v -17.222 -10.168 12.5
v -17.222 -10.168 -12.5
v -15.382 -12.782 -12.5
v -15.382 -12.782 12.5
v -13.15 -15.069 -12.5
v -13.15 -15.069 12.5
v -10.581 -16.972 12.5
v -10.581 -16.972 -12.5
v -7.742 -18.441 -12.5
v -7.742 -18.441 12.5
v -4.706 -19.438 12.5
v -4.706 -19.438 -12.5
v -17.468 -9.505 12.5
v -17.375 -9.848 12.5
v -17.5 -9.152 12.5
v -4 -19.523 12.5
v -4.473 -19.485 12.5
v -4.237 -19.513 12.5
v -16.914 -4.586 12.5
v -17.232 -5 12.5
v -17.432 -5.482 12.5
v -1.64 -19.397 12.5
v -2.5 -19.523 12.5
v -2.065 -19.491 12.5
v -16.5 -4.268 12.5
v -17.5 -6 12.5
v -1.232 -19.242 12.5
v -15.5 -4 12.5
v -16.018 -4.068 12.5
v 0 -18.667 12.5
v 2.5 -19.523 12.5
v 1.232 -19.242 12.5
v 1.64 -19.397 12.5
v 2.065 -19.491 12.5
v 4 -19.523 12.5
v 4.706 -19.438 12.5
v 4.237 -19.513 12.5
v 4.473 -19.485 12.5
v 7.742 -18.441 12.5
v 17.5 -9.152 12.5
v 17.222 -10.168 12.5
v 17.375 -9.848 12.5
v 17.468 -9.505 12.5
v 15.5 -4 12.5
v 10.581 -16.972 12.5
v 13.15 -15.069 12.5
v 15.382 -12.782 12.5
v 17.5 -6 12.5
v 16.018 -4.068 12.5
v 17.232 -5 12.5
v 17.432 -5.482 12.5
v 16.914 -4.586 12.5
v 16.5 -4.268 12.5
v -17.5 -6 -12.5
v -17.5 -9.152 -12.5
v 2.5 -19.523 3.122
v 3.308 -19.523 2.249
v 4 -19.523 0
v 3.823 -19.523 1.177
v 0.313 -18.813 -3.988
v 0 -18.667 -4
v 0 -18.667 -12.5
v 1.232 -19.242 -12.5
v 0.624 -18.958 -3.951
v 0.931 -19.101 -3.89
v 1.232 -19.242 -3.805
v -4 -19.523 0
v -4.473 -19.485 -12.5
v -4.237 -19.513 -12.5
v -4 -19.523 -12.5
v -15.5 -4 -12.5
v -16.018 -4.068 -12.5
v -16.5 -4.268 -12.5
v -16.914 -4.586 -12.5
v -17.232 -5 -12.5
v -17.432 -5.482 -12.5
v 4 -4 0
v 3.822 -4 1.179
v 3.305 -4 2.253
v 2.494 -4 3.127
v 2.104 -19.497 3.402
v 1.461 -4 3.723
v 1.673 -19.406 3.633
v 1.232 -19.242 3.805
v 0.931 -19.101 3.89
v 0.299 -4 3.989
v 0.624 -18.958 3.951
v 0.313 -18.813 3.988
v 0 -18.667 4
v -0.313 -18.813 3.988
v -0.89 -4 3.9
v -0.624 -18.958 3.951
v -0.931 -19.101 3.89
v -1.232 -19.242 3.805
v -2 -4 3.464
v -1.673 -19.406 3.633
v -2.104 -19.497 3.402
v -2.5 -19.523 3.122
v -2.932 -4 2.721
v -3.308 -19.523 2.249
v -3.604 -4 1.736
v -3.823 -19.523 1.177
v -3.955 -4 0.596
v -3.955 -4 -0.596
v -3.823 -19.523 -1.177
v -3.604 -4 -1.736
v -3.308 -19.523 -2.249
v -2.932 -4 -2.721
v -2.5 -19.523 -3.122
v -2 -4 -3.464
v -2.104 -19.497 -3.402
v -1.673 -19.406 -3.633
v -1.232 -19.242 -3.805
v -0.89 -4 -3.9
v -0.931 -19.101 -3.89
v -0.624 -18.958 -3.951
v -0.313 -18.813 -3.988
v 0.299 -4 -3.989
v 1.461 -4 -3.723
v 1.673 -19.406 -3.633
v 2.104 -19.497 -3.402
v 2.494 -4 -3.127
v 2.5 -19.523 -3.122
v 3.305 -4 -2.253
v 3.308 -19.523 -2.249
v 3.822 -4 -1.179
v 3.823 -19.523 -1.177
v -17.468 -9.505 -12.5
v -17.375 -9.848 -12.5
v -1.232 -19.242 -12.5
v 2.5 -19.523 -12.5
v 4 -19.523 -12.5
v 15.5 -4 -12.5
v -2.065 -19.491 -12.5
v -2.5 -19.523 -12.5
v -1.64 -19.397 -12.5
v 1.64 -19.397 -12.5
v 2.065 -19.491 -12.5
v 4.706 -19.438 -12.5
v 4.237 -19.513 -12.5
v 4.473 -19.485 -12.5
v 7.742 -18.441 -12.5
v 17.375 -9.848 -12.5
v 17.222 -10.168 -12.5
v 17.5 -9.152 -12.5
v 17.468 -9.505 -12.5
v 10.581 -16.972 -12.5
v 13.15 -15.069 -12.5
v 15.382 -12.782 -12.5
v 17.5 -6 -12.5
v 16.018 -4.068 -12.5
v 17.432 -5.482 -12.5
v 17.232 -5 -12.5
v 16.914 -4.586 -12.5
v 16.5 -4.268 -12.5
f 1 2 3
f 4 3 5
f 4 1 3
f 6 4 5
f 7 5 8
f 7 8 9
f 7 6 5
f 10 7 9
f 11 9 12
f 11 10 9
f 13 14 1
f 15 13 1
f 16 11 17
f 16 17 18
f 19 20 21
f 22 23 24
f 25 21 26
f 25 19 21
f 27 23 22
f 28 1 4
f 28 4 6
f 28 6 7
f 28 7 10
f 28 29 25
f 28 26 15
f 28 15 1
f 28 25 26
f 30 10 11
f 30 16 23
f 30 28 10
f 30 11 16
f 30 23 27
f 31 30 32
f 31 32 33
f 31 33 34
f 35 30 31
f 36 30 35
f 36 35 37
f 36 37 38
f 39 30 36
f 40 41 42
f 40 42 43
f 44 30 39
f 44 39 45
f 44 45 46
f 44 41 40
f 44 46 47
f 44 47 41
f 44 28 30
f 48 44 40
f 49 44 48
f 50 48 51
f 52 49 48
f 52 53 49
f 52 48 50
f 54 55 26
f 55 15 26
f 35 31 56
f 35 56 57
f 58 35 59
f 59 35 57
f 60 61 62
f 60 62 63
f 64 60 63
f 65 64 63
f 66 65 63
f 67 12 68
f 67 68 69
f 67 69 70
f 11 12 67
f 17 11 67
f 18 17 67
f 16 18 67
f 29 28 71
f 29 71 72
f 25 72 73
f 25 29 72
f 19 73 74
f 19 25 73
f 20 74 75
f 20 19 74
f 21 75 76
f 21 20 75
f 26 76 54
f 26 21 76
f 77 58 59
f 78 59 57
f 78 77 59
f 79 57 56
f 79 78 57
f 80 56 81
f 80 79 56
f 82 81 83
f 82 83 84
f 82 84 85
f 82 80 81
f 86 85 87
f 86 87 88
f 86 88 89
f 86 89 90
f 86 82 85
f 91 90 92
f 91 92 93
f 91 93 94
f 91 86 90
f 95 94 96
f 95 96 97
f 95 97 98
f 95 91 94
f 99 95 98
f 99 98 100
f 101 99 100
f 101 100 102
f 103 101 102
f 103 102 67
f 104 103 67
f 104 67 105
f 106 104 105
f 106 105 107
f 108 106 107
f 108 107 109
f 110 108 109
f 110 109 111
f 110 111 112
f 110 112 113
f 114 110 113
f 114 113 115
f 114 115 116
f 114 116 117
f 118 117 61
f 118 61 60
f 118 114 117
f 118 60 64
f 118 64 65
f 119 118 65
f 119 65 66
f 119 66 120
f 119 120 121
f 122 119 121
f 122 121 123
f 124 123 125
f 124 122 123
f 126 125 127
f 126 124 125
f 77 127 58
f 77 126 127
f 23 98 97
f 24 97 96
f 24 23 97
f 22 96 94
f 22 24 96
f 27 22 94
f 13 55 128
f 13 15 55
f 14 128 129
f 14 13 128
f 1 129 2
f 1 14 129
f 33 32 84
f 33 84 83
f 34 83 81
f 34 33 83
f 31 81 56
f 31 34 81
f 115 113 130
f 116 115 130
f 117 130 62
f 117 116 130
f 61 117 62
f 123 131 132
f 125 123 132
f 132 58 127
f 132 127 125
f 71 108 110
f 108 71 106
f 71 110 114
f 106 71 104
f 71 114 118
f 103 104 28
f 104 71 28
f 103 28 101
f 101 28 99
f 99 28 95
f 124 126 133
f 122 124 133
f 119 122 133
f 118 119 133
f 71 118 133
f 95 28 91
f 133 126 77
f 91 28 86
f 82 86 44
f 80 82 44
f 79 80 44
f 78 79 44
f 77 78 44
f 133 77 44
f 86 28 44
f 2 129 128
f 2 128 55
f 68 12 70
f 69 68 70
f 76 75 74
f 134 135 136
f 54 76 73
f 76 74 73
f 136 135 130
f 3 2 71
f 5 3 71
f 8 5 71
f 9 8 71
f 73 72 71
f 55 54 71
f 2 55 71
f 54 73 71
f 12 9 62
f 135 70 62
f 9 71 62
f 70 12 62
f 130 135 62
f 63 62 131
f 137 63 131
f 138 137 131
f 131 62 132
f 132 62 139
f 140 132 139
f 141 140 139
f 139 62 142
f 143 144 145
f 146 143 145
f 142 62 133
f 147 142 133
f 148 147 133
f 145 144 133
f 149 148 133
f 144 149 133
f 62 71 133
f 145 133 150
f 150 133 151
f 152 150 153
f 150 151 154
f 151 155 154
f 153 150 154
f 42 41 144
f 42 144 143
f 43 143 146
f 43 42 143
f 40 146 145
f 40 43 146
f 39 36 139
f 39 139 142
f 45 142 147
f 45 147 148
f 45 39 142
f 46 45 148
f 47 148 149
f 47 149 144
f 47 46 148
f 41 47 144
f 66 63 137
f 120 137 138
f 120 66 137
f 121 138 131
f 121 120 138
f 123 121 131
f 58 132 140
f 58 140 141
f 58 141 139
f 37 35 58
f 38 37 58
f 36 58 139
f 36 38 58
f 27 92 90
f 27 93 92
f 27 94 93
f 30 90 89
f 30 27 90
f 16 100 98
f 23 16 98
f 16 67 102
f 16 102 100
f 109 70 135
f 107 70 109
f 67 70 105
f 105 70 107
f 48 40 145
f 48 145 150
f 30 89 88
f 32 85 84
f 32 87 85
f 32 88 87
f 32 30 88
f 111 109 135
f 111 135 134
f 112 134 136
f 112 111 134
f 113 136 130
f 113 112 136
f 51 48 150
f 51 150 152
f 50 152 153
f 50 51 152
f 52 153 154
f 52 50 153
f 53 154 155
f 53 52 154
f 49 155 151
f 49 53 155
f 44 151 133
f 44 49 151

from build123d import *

# Parameters (mm, degrees)
PAD_DEPTH         = 12.5
SKETCH001_R       = 4
POCKET_DEPTH      = 0.001
POCKET_DEPTH_BACK = -19.523712


with BuildPart() as part:
    # Sketch → Pad (new body, symmetric)
    with BuildSketch(Plane.XY):
        with BuildLine():
            ThreePointArc((-17.222222, -10.168336), (-11.903544, -16.07189), (-4.705882, -19.438484))
            ThreePointArc((-4.705882, -19.438484), (-4.355445, -19.50158), (-4, -19.522712))
            Line((-4, -19.522712), (-2.5, -19.522712))
            ThreePointArc((-2.5, -19.522712), (-1.850681, -19.4516), (-1.232145, -19.241635))
            Line((-1.232145, -19.241635), (0, -18.667076))
            Line((0, -18.667076), (1.232145, -19.241635))
            ThreePointArc((1.232145, -19.241635), (1.850681, -19.4516), (2.5, -19.522712))
            Line((2.5, -19.522712), (4, -19.522712))
            ThreePointArc((4, -19.522712), (4.355445, -19.50158), (4.705882, -19.438484))
            ThreePointArc((4.705882, -19.438484), (11.903544, -16.07189), (17.222222, -10.168336))
            ThreePointArc((17.222222, -10.168336), (17.429306, -9.678549), (17.5, -9.151503))
            Line((17.5, -9.151503), (17.5, -6))
            ThreePointArc((17.5, -6), (16.914214, -4.585786), (15.5, -4))
            Line((-15.5, -4), (15.5, -4))
            ThreePointArc((-15.5, -4), (-16.914214, -4.585786), (-17.5, -6))
            Line((-17.5, -9.151503), (-17.5, -6))
            ThreePointArc((-17.5, -9.151503), (-17.429306, -9.678549), (-17.222222, -10.168336))
        make_face()
    extrude(amount=PAD_DEPTH, both=True)

    # Sketch001 → Pocket (cut, two sides)
    with BuildSketch(Plane.XZ) as pocket_sk:
        Circle(SKETCH001_R)
    extrude(amount=-POCKET_DEPTH, mode=Mode.SUBTRACT)
    extrude(pocket_sk.sketch, amount=-POCKET_DEPTH_BACK, mode=Mode.SUBTRACT)


solid = part.part
